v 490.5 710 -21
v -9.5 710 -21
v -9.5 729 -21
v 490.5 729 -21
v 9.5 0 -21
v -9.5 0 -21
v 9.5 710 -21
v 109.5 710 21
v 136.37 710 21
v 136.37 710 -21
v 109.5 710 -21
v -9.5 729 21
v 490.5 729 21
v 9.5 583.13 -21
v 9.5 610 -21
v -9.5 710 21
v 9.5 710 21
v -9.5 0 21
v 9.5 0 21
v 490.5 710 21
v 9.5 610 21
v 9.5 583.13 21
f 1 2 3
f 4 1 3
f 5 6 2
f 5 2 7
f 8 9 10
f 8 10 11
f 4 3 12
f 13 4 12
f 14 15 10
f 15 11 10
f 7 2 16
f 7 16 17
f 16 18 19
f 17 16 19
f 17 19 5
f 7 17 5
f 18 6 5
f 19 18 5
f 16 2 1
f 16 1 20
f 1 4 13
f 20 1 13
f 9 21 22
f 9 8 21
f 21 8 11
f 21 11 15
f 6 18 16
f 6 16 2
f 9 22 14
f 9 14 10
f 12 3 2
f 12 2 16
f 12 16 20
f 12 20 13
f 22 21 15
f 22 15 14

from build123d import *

# Parameters (mm, degrees)
CROQUIS1_W              = 19
CROQUIS1_H              = 42
SALIENTE_EXTRUIR1_DEPTH = 710
CROQUIS2_W              = 42
CROQUIS2_H              = 19
SALIENTE_EXTRUIR2_DEPTH = 500
SALIENTE_EXTRUIR3_DEPTH = 42


with BuildPart() as part:
    # Croquis1 → Saliente-Extruir1 (new body)
    with BuildSketch(Plane(origin=(0, 0, 0), x_dir=(1, 0, 0), z_dir=(0, 1, 0))):
        Rectangle(CROQUIS1_W, CROQUIS1_H)
    extrude(amount=SALIENTE_EXTRUIR1_DEPTH)


with BuildPart() as body_2:
    # Croquis2 → Saliente-Extruir2 (new body)
    with BuildSketch(Plane.ZY.offset(9.5)):
        with Locations((0, 719.5)):
            Rectangle(CROQUIS2_W, CROQUIS2_H)
    extrude(amount=-SALIENTE_EXTRUIR2_DEPTH)


with BuildPart() as body_3:
    # Croquis3 → Saliente-Extruir3 (new body)
    with BuildSketch(Plane.XY.offset(21)):
        Polygon((9.5, 610), (9.5, 583.129942315), (136.370057685, 710), (109.5, 710), align=None)
    extrude(amount=-SALIENTE_EXTRUIR3_DEPTH)


solid = Compound([part.part, body_2.part, body_3.part])
